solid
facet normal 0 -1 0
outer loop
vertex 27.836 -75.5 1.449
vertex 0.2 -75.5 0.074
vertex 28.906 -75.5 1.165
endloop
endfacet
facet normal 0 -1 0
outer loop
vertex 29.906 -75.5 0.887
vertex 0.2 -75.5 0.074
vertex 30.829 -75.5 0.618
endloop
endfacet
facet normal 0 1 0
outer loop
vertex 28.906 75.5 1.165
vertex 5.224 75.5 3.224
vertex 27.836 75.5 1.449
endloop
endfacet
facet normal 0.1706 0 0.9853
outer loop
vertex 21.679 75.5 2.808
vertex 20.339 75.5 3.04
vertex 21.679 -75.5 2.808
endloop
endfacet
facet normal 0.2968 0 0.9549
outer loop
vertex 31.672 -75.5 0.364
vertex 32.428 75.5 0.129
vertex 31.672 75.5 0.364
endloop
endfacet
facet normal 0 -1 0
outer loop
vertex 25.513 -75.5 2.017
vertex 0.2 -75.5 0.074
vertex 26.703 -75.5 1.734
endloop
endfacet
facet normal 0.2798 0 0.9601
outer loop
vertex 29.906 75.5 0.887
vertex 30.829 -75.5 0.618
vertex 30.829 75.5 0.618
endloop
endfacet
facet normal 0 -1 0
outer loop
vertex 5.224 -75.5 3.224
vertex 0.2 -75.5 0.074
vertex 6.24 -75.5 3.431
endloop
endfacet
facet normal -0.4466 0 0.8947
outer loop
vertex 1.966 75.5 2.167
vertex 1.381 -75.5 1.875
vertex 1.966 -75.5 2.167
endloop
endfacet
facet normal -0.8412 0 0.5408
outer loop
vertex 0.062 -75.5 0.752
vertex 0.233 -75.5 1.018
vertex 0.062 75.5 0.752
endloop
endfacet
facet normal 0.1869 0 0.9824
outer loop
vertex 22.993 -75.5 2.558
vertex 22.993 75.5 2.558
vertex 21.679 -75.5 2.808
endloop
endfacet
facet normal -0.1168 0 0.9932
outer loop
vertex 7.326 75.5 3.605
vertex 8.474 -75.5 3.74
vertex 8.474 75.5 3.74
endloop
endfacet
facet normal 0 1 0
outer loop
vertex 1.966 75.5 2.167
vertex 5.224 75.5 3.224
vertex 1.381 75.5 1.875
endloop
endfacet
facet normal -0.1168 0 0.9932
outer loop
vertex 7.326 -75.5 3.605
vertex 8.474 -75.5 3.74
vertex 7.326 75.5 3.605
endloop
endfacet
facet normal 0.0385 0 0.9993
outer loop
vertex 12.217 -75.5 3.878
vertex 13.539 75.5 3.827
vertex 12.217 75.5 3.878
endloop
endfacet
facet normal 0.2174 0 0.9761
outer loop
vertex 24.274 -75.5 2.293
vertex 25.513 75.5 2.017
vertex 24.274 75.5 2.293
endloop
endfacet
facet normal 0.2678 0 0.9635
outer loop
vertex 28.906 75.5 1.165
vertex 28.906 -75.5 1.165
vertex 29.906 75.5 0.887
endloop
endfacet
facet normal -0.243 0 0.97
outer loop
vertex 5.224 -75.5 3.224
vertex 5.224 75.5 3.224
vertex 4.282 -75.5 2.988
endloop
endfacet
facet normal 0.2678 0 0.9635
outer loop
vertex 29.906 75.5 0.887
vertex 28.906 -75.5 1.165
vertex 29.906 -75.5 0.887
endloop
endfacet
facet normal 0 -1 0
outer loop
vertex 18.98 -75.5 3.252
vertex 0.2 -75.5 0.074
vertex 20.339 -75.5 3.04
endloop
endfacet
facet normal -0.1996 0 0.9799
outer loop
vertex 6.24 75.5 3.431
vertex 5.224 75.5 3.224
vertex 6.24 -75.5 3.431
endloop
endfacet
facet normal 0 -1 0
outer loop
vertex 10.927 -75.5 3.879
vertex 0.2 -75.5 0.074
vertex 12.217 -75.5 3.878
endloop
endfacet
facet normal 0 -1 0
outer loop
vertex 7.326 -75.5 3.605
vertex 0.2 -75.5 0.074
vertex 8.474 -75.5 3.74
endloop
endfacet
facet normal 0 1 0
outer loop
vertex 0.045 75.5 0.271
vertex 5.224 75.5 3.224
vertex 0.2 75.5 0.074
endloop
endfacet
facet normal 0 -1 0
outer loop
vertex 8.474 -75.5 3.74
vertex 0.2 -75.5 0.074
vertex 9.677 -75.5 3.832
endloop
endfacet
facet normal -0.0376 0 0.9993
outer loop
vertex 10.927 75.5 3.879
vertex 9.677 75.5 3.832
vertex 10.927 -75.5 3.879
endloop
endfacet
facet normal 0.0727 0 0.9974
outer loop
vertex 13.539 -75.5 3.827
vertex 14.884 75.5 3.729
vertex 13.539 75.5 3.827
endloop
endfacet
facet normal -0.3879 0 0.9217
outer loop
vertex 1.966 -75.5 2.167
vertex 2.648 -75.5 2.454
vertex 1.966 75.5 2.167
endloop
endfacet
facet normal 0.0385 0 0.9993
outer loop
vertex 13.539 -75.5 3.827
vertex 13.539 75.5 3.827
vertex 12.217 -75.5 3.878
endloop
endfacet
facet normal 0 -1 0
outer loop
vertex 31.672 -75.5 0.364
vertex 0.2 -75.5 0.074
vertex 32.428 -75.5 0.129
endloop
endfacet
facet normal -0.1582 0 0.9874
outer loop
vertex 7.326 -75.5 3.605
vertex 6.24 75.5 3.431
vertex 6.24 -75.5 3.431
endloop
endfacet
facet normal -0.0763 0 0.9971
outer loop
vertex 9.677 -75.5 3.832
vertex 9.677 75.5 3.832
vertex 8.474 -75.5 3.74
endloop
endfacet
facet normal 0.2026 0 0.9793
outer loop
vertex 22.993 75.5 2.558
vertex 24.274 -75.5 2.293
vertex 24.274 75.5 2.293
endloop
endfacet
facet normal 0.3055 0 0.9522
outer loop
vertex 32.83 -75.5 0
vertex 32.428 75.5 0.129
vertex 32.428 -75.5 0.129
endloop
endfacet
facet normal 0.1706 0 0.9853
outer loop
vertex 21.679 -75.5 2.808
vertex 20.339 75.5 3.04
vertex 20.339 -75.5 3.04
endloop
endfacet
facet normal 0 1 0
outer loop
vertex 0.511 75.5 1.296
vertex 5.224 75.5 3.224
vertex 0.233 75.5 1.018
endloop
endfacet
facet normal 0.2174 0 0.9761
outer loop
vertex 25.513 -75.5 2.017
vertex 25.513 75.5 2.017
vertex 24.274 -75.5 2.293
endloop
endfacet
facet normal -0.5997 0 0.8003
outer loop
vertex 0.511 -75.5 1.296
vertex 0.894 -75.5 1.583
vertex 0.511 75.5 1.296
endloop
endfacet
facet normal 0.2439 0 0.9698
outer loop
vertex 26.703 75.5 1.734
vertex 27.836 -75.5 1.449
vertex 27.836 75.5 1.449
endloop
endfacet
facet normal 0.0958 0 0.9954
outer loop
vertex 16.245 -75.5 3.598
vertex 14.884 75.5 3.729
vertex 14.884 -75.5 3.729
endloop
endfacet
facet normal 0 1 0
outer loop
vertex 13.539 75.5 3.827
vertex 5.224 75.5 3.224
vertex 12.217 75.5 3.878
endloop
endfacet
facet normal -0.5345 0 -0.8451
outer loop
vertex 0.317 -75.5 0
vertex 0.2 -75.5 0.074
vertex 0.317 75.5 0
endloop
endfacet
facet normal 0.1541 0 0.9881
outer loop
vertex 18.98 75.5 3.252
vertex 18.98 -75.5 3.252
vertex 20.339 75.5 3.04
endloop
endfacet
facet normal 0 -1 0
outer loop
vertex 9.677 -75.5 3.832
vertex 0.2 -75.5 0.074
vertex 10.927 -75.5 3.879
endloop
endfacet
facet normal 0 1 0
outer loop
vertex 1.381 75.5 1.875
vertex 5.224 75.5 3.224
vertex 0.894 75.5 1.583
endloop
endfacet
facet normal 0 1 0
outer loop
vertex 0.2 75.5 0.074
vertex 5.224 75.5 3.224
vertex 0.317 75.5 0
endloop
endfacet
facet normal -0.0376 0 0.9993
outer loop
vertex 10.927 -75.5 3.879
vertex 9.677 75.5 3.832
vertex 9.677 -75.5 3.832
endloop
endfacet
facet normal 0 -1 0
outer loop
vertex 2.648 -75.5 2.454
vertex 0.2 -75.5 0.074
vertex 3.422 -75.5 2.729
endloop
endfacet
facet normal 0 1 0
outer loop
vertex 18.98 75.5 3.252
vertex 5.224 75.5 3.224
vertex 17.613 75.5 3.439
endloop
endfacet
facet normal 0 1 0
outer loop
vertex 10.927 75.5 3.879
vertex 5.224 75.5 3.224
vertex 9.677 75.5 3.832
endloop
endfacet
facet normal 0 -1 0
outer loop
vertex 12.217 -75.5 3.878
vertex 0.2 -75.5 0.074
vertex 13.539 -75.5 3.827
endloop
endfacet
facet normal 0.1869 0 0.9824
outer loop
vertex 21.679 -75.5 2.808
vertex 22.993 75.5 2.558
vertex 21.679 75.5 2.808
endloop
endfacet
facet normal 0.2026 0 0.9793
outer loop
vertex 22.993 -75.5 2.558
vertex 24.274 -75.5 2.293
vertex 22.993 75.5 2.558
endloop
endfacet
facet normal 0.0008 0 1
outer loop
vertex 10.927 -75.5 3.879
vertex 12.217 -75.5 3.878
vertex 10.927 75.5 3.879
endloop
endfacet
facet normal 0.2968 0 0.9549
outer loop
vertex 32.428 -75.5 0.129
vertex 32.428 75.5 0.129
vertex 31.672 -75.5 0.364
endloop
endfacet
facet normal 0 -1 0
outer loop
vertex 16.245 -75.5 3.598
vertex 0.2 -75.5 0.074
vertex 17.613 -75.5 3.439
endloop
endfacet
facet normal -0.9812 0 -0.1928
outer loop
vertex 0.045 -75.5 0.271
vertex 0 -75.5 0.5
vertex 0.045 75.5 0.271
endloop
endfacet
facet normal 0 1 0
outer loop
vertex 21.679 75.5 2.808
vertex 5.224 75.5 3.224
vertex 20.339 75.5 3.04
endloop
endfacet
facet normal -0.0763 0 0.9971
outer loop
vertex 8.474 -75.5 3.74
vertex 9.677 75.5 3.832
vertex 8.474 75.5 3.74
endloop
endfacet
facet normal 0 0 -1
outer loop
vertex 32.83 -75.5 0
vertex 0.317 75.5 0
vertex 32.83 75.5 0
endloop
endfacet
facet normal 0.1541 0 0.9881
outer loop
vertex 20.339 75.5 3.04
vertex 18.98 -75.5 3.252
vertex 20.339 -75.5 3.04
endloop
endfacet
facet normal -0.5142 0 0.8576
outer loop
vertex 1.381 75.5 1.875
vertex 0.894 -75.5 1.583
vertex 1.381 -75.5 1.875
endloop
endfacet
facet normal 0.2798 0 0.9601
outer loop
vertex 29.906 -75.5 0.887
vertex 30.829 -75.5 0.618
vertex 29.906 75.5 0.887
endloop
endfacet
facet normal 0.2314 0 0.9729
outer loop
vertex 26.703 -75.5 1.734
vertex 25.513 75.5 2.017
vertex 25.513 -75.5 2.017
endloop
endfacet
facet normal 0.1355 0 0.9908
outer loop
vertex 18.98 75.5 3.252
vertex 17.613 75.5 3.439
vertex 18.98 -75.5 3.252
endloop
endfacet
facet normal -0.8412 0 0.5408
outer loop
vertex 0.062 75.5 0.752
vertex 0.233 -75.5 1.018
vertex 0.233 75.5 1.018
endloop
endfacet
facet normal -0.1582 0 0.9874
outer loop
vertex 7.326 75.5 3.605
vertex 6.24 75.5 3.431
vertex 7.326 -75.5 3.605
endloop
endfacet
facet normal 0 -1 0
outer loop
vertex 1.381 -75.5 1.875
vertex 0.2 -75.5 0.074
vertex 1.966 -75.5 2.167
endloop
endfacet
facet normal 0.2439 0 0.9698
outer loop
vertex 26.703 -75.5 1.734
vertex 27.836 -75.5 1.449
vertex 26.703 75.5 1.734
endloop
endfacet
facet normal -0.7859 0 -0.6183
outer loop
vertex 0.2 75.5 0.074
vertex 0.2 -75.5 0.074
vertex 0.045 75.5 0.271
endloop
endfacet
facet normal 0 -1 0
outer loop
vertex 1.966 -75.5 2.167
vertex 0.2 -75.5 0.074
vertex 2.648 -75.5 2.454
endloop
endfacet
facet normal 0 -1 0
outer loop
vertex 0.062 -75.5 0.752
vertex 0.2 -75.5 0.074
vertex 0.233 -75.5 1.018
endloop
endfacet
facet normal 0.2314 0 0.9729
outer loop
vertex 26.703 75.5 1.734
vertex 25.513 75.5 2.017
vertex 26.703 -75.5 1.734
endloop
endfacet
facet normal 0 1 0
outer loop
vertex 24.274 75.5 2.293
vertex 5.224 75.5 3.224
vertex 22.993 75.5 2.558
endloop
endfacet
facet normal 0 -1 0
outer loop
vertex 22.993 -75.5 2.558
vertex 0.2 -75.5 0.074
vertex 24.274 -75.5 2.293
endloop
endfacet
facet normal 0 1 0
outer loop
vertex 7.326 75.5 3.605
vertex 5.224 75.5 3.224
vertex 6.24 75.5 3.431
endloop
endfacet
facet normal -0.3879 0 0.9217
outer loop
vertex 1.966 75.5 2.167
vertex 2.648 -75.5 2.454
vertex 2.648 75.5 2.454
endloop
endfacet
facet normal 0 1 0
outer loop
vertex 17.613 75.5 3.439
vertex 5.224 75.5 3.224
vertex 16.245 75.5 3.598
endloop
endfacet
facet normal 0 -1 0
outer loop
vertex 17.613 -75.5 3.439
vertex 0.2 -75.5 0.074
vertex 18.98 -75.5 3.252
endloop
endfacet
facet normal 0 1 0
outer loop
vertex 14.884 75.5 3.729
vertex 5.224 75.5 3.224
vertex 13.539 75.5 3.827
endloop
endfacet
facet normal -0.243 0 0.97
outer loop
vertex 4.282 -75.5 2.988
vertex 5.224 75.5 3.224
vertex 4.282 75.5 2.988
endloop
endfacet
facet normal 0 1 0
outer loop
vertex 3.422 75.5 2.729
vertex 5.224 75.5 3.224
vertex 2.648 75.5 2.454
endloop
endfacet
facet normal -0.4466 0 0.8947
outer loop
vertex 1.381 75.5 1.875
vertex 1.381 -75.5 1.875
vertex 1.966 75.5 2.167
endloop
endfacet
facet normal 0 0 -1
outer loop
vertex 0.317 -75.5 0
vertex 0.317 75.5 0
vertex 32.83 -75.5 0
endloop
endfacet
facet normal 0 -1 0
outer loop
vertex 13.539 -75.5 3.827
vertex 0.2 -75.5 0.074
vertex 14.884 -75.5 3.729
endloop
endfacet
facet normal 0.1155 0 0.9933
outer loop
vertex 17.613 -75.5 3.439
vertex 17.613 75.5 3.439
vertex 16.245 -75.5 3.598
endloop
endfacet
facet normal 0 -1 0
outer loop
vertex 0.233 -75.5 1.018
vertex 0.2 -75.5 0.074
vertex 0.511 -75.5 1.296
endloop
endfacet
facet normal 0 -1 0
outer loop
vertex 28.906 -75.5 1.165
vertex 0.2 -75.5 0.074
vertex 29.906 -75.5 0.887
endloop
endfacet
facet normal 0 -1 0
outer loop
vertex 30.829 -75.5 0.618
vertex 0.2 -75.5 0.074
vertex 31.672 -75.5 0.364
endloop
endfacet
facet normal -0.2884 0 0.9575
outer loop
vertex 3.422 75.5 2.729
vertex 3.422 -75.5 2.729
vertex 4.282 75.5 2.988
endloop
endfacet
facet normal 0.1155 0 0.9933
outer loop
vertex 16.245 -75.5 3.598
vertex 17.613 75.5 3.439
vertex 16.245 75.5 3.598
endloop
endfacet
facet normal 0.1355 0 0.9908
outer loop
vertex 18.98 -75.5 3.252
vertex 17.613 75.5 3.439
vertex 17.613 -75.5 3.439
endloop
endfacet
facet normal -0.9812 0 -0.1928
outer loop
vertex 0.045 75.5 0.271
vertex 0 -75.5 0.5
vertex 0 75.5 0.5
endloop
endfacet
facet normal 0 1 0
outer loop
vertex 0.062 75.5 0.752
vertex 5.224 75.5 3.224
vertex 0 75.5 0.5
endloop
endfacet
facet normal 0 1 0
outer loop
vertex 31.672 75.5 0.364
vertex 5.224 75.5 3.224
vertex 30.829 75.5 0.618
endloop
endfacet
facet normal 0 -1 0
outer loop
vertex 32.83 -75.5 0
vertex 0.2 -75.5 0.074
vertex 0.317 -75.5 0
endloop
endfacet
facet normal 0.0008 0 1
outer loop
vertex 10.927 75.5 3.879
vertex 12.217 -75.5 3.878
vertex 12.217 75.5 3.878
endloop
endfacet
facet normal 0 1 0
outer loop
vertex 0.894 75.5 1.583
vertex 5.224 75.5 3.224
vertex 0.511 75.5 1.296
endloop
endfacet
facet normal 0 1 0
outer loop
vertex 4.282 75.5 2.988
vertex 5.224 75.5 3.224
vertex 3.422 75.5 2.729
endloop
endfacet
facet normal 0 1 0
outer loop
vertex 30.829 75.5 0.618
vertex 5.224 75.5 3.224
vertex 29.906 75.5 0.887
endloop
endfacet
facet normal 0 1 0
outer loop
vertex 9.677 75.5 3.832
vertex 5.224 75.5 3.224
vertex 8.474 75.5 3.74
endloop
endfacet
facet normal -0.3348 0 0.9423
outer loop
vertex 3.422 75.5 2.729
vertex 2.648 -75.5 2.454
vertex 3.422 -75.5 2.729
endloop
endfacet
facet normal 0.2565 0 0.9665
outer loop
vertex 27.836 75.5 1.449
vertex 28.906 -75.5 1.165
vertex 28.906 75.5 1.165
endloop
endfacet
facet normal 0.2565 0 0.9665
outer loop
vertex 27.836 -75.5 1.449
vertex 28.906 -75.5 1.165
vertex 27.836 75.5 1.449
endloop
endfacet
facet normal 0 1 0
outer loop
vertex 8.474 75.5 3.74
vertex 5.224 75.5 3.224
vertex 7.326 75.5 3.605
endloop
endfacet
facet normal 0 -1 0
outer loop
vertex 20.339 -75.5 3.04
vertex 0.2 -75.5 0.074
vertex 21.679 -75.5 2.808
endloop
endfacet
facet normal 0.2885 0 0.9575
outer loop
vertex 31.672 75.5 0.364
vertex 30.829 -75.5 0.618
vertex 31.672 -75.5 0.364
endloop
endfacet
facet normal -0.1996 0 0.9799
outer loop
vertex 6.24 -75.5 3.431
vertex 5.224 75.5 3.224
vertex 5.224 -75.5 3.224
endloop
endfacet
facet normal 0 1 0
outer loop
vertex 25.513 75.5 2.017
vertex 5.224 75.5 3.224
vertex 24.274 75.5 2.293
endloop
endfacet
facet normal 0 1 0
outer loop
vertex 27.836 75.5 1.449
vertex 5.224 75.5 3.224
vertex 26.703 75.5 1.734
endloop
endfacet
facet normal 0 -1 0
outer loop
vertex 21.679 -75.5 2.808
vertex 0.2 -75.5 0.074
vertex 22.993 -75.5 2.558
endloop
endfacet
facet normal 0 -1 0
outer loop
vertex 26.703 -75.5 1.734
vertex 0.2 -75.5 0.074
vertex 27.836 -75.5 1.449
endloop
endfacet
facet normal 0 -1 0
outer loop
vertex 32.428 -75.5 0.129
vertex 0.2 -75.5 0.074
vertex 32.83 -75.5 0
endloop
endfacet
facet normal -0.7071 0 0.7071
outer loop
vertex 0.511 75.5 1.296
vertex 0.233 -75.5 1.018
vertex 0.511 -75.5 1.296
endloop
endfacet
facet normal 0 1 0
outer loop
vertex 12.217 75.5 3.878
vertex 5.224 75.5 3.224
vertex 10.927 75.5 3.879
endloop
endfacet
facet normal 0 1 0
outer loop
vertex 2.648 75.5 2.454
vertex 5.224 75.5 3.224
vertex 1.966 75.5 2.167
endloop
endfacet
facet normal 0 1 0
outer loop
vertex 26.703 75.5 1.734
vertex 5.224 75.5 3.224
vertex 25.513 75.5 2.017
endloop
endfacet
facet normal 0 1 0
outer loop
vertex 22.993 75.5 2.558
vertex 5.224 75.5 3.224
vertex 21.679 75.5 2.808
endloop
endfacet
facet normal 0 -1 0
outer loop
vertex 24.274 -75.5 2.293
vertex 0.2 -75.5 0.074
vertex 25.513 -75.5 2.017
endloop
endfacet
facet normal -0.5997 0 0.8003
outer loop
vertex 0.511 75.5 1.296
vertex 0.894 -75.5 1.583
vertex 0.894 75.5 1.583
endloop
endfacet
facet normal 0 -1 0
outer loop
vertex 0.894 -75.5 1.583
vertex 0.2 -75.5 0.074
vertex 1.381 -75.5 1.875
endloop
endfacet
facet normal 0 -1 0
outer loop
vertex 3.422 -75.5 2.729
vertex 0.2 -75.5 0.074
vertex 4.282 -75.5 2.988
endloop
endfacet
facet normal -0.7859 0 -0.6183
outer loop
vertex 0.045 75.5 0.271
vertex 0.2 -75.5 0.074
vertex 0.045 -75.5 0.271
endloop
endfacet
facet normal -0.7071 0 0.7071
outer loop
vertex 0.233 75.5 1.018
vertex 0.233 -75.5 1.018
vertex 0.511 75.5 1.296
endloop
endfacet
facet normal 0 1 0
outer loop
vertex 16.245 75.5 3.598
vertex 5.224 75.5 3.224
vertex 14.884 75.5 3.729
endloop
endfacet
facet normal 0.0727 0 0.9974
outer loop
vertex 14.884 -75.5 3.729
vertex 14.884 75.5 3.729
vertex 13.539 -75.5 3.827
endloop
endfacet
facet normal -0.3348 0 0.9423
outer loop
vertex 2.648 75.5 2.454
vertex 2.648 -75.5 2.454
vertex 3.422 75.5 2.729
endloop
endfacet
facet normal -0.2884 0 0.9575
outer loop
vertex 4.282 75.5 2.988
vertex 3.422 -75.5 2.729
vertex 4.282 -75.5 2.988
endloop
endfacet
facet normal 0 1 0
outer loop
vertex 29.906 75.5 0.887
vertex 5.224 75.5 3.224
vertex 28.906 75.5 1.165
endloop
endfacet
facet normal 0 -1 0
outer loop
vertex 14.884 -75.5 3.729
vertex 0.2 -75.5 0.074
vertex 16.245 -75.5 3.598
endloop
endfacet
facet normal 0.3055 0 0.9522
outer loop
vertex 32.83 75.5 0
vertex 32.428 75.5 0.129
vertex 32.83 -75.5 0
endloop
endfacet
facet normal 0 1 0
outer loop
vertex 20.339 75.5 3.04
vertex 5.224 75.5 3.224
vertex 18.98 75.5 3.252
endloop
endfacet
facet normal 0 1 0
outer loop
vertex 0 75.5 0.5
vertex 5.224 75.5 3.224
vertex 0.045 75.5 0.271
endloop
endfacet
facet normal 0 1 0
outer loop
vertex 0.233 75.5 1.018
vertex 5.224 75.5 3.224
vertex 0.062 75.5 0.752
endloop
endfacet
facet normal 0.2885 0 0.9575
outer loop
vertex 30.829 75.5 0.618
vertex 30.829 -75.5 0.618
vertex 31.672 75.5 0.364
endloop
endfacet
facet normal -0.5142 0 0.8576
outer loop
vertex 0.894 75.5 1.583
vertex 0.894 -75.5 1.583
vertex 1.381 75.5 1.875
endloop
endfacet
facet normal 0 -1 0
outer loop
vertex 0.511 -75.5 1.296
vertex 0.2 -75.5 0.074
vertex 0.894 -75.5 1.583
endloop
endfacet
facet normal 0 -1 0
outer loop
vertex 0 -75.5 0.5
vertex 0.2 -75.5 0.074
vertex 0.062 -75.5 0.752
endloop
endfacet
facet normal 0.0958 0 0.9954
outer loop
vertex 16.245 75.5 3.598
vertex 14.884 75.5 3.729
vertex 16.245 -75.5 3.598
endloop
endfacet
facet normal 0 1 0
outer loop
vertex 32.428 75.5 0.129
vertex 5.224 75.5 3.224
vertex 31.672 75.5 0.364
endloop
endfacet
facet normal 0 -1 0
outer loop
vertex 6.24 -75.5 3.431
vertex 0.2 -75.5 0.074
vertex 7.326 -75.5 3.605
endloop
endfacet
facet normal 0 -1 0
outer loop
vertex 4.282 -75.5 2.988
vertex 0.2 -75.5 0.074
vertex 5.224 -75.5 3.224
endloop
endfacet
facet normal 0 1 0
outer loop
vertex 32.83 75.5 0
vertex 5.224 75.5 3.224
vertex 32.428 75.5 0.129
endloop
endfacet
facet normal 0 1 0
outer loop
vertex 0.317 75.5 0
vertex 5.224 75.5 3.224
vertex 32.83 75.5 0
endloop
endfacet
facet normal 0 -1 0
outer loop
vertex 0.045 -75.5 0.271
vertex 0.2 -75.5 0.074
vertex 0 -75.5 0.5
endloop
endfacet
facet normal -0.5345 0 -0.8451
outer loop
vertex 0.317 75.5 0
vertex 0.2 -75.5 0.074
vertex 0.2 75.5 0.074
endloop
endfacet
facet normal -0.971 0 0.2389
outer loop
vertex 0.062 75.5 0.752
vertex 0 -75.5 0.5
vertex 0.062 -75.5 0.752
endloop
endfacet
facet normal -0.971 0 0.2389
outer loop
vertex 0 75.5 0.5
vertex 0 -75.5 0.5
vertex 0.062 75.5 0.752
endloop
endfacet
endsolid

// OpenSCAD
// file: glider.scad
/*
	Openscad glider.

    Copyright (C) Tim Molteno, tim@molteno.net

    
    This program is free software: you can redistribute it and/or modify
    it under the terms of the GNU General Public License as published by
    the Free Software Foundation, either version 3 of the License, or
    (at your option) any later version.

    This program is distributed in the hope that it will be useful,
    but WITHOUT ANY WARRANTY; without even the implied warranty of
    MERCHANTABILITY or FITNESS FOR A PARTICULAR PURPOSE.  See the
    GNU General Public License for more details.

    You should have received a copy of the GNU General Public License
    along with this program.  If not, see <http://www.gnu.org/licenses/>.
*/

/* NACA 5412 Airfoil M=5.0% P=40.0% T=12.0% */

module airfoil(s) {
rotate([0,0,-2]) scale([s,s,s]) polygon(points=[
 [1.000000,-0.000000], [0.998459, 0.000480], [0.993844, 0.001912], [0.986185, 0.004266],
 [0.975528, 0.007497], [0.961940, 0.011541], [0.945503, 0.016321], [0.926320, 0.021747],
 [0.904508, 0.027720], [0.880203, 0.034131], [0.853553, 0.040868], [0.824724, 0.047815],
 [0.793893, 0.054856], [0.761249, 0.061875], [0.726995, 0.068760], [0.691342, 0.075399],
 [0.654508, 0.081690], [0.616723, 0.087531], [0.578217, 0.092831], [0.539230, 0.097504],
 [0.500000, 0.101473], [0.460770, 0.104671], [0.421783, 0.107042], [0.383277, 0.108495],
 [0.345492, 0.108628], [0.308658, 0.107381], [0.273005, 0.104801], [0.238751, 0.100962],
 [0.206107, 0.095964], [0.175276, 0.089926], [0.146447, 0.082992], [0.119797, 0.075318],
 [0.095492, 0.067072], [0.073680, 0.058429], [0.054497, 0.049563], [0.038060, 0.040642],
 [0.024472, 0.031824], [0.013815, 0.023248], [0.006156, 0.015030], [0.001541, 0.007261],
 [0.000000, 0.000000], [0.001541,-0.006492], [0.006156,-0.011976], [0.013815,-0.016460],
 [0.024472,-0.019963], [0.038060,-0.022517], [0.054497,-0.024170], [0.073680,-0.024982],
 [0.095492,-0.025026], [0.119797,-0.024389], [0.146447,-0.023173], [0.175276,-0.021490],
 [0.206107,-0.019460], [0.238751,-0.017213], [0.273005,-0.014881], [0.308658,-0.012596],
 [0.345492,-0.010485], [0.383277,-0.008670], [0.421783,-0.007174], [0.460770,-0.005697],
 [0.500000,-0.004250], [0.539230,-0.002888], [0.578217,-0.001653], [0.616723,-0.000578],
 [0.654508, 0.000317], [0.691342, 0.001023], [0.726995, 0.001539], [0.761249, 0.001875],
 [0.793893, 0.002047], [0.824724, 0.002077], [0.853553, 0.001991], [0.880203, 0.001815],
 [0.904508, 0.001578], [0.926320, 0.001305], [0.945503, 0.001019], [0.961940, 0.000743],
 [0.975528, 0.000494], [0.986185, 0.000286], [0.993844, 0.000130], [0.998459, 0.000033],
 [1.000000, 0.000000]]);
}

/* This is a foil with a flat bottom for easy printing */
module flat_foil(s) {
  difference() {
    translate([0, 0.5]) airfoil(s);
    translate([0,-2]) square([s,2]);
  }
}
	
wingspan = 150;
tail_length = 80;
nose_length = 40;

wing_chord = 35;
wing_z = 4;

module wing_left() {
  rotate([90,0,0]) hull() {
     translate([35,0,wingspan/2]) linear_extrude(height=0.1, center=true) flat_foil(20);
     linear_extrude(height=0.11, center=true) flat_foil(wing_chord);
    }
}

module wing_center() {
  rotate([90,0,0]) hull() {
     translate([0,0,wingspan/2]) linear_extrude(height=1, center=true) flat_foil(wing_chord);
     translate([0,0,-wingspan/2]) linear_extrude(height=1, center=true) flat_foil(wing_chord);
    }
}


module wing_right() {
  mirror([0,1,0]) wing_left();
}


module fuselage() {
  difference() {
    hull() {
      translate([-nose_length,0,5]) rotate([0,90,0]) cylinder(r=6, h=5, $fn=21);
      translate([tail_length+20,0,2]) sphere(r=3, $fn=21);
    }
    translate([0,0,wing_z]) wing_center();
    translate([tail_length,0,0]) stabilizer_vert();
  }
}

module stabilizer_right() {
  hull() {
    cube([20,2,1.5]);
    translate([15, 20, 0]) cylinder(r=6, h=0.6);
  }
}

module stabilizer_left() {
  mirror([0,1,0]) stabilizer_right();
}

module stabilizer_vert() {
  hull() {
    translate([0, -1, 1]) cube([20,2,1]);
    translate([15, 0, 15]) rotate([90,0,0]) cylinder(r=4, h=0.8);
  }
}

/* This is the whole plane, as assembled. To print, you
   must generate a separate .stl for each of these parts
*/
module plane() {
  union() {
    fuselage();
    %translate([0,0,wing_z]) {
      wing_center();
      translate([0, wingspan/2,0]) rotate([10,0,0]) wing_right();
      translate([0, -wingspan/2,0]) rotate([-10,0,0])  wing_left();
    }
    translate([tail_length,0,0]) stabilizer_right();
    translate([tail_length,0,0]) stabilizer_left();
    %translate([tail_length,0,0]) stabilizer_vert();
  }
}

plane();
// main file
/*
	Openscad glider.

    Center Wing

    Copyright (C) Tim Molteno, tim@molteno.net

    
    This program is free software: you can redistribute it and/or modify
    it under the terms of the GNU General Public License as published by
    the Free Software Foundation, either version 3 of the License, or
    (at your option) any later version.

    This program is distributed in the hope that it will be useful,
    but WITHOUT ANY WARRANTY; without even the implied warranty of
    MERCHANTABILITY or FITNESS FOR A PARTICULAR PURPOSE.  See the
    GNU General Public License for more details.

    You should have received a copy of the GNU General Public License
    along with this program.  If not, see <http://www.gnu.org/licenses/>.
*/
use <glider.scad>;

wing_center();
